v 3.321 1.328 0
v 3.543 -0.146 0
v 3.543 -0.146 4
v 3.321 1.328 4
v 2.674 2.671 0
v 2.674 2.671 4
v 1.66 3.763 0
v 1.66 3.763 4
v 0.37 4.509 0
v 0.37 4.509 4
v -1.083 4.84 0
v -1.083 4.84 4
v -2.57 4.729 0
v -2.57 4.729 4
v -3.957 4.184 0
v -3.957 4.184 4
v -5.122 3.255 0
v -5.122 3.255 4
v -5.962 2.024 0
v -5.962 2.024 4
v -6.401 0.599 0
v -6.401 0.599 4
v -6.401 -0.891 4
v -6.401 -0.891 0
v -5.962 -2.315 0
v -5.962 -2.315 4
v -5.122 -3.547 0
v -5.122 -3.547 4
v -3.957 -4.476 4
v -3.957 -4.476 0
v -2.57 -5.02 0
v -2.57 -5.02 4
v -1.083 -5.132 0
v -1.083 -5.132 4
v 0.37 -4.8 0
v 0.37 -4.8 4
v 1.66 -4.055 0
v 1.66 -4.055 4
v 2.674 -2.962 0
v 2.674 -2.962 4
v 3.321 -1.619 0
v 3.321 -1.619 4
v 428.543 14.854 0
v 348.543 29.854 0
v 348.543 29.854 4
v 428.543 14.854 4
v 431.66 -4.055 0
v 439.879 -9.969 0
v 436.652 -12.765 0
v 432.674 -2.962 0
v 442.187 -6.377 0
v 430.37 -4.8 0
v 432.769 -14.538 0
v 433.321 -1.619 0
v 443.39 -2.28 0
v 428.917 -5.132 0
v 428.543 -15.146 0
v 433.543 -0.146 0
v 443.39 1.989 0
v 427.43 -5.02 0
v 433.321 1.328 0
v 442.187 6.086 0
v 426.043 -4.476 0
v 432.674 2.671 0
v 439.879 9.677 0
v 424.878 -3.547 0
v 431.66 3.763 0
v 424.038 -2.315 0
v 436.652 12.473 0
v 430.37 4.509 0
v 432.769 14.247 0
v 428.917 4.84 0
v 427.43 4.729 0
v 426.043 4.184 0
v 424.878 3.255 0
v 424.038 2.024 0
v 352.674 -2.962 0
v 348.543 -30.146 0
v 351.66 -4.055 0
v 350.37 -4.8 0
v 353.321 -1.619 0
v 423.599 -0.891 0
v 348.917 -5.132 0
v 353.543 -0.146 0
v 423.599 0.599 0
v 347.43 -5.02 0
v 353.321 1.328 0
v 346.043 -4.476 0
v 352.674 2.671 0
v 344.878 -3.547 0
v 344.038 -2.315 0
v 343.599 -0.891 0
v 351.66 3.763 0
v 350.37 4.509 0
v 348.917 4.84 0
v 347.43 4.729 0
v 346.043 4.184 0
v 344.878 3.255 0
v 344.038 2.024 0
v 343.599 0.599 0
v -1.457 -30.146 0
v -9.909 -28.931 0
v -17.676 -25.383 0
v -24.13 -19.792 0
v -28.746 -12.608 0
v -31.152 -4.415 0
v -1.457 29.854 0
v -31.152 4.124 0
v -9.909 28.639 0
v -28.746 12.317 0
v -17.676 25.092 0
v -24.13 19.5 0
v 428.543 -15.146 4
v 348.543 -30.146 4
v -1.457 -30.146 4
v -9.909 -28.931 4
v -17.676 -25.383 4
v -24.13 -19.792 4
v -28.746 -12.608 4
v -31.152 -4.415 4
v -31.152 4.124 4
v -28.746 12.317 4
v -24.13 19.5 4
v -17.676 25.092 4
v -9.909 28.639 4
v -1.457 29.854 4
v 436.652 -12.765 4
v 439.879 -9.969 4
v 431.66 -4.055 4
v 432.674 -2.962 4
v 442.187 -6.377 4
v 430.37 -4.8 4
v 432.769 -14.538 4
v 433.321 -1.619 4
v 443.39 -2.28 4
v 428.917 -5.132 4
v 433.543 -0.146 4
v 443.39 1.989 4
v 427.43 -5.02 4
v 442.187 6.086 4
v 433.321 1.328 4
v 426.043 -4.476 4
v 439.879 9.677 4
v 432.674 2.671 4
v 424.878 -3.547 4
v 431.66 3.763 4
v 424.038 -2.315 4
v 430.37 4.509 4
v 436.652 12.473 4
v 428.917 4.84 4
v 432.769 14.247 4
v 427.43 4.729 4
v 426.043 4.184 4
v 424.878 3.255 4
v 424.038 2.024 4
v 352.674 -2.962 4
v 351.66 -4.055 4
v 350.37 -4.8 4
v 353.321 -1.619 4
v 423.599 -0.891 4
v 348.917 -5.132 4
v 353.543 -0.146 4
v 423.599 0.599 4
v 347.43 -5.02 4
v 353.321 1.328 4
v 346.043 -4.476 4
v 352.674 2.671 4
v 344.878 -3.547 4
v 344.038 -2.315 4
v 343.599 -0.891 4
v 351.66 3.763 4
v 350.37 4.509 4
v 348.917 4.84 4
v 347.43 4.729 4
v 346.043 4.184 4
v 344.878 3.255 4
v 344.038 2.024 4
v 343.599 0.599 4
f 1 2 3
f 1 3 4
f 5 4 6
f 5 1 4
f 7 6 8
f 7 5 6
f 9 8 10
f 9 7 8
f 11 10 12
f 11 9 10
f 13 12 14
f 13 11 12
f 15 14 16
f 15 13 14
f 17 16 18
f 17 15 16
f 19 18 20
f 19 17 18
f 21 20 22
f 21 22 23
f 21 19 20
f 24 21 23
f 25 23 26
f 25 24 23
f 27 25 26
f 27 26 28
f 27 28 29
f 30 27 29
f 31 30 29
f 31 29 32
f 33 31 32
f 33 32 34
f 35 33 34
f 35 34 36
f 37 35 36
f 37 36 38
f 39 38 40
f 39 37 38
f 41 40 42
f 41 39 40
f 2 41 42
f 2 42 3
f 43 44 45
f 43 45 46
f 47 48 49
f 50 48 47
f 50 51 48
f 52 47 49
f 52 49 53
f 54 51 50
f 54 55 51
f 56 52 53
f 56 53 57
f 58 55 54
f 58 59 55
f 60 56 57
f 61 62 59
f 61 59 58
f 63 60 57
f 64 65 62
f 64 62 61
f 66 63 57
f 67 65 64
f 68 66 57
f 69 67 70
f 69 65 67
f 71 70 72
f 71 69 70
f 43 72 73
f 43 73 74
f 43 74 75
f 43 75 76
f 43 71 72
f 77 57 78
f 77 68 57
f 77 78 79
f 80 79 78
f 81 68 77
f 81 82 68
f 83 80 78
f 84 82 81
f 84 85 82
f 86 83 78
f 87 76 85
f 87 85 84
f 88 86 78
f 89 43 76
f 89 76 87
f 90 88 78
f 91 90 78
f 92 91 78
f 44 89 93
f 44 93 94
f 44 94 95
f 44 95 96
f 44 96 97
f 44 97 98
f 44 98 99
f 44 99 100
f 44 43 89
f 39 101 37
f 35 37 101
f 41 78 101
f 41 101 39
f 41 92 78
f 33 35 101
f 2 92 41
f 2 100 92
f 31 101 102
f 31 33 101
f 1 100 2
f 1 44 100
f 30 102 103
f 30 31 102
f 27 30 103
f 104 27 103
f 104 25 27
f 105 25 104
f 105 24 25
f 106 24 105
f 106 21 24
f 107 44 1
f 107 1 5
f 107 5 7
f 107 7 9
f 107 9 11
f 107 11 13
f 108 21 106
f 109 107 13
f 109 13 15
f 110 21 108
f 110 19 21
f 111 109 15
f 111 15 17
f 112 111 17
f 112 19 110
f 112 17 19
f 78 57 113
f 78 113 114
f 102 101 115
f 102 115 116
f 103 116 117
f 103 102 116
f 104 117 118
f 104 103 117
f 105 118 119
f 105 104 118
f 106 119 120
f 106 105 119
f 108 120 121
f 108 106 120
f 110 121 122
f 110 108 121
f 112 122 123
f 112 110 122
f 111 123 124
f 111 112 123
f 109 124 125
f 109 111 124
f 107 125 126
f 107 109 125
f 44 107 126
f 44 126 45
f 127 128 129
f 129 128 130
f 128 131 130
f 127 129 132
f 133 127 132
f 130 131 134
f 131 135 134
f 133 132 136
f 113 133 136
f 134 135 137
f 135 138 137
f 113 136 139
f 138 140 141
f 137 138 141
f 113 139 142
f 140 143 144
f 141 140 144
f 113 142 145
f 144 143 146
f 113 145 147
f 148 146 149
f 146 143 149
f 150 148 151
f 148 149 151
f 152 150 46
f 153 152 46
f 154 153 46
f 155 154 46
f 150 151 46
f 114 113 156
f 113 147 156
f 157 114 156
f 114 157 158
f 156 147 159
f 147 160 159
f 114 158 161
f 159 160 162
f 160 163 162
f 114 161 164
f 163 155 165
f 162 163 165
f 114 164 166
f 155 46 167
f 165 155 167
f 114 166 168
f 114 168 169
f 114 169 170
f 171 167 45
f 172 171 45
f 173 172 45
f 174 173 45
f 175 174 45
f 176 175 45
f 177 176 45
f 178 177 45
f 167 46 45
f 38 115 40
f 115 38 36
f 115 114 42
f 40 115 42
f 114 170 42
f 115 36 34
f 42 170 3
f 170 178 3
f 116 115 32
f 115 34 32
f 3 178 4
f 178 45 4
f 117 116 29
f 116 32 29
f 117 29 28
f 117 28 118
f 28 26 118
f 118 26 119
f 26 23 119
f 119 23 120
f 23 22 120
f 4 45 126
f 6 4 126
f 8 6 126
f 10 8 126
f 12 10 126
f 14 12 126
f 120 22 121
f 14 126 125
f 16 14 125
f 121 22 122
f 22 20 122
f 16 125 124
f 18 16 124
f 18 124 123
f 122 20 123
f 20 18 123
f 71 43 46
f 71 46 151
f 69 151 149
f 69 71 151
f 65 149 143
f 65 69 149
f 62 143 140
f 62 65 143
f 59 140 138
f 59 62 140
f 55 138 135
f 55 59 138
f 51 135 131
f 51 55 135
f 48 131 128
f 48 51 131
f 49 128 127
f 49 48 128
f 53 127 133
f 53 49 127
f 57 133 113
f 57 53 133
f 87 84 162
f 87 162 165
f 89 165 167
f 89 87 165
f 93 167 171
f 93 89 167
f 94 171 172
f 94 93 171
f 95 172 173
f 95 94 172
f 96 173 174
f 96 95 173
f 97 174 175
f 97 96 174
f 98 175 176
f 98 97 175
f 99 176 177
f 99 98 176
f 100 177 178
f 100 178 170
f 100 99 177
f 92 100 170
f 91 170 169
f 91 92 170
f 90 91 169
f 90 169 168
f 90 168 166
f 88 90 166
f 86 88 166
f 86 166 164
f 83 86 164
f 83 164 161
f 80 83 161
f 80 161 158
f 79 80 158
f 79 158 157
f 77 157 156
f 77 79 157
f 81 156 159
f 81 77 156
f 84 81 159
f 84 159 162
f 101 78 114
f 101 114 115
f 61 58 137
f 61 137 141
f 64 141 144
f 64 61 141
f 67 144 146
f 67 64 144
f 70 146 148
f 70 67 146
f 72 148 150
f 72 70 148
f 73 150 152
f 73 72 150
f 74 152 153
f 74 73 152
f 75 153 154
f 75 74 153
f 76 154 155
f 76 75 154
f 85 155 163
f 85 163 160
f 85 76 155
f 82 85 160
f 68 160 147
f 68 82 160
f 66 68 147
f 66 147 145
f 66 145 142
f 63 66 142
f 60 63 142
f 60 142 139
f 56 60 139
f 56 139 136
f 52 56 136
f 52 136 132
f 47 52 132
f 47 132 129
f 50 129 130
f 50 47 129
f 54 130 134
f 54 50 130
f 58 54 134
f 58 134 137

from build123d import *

# Parameters (mm, degrees)
SKETCH_1_R      = 5
EXTRUDE_1_DEPTH = 4


with BuildPart() as part:
    # 草图1 → 凸台-拉伸1 (new body)
    with BuildSketch(Plane.XY):
        with BuildLine():
            Line((428.542857143, -15.145714286), (348.542857143, -30.145714286))
            Line((348.542857143, -30.145714286), (-1.457142857, -30.145714286))
            ThreePointArc((-1.457142857, -30.145714286), (-31.457142857, -0.145714286), (-1.457142857, 29.854285714))
            Line((-1.457142857, 29.854285714), (348.542857143, 29.854285714))
            Line((348.542857143, 29.854285714), (428.542857143, 14.854285714))
            ThreePointArc((428.542857143, 14.854285714), (443.542857143, -0.145714286), (428.542857143, -15.145714286))
        make_face()
        with Locations((428.542857143, -0.145714286)):
            Circle(SKETCH_1_R, mode=Mode.SUBTRACT)
        with Locations((-1.457142857, -0.145714286)):
            Circle(SKETCH_1_R, mode=Mode.SUBTRACT)
        with Locations((348.542857143, -0.145714286)):
            Circle(SKETCH_1_R, mode=Mode.SUBTRACT)
    extrude(amount=EXTRUDE_1_DEPTH)


solid = part.part
